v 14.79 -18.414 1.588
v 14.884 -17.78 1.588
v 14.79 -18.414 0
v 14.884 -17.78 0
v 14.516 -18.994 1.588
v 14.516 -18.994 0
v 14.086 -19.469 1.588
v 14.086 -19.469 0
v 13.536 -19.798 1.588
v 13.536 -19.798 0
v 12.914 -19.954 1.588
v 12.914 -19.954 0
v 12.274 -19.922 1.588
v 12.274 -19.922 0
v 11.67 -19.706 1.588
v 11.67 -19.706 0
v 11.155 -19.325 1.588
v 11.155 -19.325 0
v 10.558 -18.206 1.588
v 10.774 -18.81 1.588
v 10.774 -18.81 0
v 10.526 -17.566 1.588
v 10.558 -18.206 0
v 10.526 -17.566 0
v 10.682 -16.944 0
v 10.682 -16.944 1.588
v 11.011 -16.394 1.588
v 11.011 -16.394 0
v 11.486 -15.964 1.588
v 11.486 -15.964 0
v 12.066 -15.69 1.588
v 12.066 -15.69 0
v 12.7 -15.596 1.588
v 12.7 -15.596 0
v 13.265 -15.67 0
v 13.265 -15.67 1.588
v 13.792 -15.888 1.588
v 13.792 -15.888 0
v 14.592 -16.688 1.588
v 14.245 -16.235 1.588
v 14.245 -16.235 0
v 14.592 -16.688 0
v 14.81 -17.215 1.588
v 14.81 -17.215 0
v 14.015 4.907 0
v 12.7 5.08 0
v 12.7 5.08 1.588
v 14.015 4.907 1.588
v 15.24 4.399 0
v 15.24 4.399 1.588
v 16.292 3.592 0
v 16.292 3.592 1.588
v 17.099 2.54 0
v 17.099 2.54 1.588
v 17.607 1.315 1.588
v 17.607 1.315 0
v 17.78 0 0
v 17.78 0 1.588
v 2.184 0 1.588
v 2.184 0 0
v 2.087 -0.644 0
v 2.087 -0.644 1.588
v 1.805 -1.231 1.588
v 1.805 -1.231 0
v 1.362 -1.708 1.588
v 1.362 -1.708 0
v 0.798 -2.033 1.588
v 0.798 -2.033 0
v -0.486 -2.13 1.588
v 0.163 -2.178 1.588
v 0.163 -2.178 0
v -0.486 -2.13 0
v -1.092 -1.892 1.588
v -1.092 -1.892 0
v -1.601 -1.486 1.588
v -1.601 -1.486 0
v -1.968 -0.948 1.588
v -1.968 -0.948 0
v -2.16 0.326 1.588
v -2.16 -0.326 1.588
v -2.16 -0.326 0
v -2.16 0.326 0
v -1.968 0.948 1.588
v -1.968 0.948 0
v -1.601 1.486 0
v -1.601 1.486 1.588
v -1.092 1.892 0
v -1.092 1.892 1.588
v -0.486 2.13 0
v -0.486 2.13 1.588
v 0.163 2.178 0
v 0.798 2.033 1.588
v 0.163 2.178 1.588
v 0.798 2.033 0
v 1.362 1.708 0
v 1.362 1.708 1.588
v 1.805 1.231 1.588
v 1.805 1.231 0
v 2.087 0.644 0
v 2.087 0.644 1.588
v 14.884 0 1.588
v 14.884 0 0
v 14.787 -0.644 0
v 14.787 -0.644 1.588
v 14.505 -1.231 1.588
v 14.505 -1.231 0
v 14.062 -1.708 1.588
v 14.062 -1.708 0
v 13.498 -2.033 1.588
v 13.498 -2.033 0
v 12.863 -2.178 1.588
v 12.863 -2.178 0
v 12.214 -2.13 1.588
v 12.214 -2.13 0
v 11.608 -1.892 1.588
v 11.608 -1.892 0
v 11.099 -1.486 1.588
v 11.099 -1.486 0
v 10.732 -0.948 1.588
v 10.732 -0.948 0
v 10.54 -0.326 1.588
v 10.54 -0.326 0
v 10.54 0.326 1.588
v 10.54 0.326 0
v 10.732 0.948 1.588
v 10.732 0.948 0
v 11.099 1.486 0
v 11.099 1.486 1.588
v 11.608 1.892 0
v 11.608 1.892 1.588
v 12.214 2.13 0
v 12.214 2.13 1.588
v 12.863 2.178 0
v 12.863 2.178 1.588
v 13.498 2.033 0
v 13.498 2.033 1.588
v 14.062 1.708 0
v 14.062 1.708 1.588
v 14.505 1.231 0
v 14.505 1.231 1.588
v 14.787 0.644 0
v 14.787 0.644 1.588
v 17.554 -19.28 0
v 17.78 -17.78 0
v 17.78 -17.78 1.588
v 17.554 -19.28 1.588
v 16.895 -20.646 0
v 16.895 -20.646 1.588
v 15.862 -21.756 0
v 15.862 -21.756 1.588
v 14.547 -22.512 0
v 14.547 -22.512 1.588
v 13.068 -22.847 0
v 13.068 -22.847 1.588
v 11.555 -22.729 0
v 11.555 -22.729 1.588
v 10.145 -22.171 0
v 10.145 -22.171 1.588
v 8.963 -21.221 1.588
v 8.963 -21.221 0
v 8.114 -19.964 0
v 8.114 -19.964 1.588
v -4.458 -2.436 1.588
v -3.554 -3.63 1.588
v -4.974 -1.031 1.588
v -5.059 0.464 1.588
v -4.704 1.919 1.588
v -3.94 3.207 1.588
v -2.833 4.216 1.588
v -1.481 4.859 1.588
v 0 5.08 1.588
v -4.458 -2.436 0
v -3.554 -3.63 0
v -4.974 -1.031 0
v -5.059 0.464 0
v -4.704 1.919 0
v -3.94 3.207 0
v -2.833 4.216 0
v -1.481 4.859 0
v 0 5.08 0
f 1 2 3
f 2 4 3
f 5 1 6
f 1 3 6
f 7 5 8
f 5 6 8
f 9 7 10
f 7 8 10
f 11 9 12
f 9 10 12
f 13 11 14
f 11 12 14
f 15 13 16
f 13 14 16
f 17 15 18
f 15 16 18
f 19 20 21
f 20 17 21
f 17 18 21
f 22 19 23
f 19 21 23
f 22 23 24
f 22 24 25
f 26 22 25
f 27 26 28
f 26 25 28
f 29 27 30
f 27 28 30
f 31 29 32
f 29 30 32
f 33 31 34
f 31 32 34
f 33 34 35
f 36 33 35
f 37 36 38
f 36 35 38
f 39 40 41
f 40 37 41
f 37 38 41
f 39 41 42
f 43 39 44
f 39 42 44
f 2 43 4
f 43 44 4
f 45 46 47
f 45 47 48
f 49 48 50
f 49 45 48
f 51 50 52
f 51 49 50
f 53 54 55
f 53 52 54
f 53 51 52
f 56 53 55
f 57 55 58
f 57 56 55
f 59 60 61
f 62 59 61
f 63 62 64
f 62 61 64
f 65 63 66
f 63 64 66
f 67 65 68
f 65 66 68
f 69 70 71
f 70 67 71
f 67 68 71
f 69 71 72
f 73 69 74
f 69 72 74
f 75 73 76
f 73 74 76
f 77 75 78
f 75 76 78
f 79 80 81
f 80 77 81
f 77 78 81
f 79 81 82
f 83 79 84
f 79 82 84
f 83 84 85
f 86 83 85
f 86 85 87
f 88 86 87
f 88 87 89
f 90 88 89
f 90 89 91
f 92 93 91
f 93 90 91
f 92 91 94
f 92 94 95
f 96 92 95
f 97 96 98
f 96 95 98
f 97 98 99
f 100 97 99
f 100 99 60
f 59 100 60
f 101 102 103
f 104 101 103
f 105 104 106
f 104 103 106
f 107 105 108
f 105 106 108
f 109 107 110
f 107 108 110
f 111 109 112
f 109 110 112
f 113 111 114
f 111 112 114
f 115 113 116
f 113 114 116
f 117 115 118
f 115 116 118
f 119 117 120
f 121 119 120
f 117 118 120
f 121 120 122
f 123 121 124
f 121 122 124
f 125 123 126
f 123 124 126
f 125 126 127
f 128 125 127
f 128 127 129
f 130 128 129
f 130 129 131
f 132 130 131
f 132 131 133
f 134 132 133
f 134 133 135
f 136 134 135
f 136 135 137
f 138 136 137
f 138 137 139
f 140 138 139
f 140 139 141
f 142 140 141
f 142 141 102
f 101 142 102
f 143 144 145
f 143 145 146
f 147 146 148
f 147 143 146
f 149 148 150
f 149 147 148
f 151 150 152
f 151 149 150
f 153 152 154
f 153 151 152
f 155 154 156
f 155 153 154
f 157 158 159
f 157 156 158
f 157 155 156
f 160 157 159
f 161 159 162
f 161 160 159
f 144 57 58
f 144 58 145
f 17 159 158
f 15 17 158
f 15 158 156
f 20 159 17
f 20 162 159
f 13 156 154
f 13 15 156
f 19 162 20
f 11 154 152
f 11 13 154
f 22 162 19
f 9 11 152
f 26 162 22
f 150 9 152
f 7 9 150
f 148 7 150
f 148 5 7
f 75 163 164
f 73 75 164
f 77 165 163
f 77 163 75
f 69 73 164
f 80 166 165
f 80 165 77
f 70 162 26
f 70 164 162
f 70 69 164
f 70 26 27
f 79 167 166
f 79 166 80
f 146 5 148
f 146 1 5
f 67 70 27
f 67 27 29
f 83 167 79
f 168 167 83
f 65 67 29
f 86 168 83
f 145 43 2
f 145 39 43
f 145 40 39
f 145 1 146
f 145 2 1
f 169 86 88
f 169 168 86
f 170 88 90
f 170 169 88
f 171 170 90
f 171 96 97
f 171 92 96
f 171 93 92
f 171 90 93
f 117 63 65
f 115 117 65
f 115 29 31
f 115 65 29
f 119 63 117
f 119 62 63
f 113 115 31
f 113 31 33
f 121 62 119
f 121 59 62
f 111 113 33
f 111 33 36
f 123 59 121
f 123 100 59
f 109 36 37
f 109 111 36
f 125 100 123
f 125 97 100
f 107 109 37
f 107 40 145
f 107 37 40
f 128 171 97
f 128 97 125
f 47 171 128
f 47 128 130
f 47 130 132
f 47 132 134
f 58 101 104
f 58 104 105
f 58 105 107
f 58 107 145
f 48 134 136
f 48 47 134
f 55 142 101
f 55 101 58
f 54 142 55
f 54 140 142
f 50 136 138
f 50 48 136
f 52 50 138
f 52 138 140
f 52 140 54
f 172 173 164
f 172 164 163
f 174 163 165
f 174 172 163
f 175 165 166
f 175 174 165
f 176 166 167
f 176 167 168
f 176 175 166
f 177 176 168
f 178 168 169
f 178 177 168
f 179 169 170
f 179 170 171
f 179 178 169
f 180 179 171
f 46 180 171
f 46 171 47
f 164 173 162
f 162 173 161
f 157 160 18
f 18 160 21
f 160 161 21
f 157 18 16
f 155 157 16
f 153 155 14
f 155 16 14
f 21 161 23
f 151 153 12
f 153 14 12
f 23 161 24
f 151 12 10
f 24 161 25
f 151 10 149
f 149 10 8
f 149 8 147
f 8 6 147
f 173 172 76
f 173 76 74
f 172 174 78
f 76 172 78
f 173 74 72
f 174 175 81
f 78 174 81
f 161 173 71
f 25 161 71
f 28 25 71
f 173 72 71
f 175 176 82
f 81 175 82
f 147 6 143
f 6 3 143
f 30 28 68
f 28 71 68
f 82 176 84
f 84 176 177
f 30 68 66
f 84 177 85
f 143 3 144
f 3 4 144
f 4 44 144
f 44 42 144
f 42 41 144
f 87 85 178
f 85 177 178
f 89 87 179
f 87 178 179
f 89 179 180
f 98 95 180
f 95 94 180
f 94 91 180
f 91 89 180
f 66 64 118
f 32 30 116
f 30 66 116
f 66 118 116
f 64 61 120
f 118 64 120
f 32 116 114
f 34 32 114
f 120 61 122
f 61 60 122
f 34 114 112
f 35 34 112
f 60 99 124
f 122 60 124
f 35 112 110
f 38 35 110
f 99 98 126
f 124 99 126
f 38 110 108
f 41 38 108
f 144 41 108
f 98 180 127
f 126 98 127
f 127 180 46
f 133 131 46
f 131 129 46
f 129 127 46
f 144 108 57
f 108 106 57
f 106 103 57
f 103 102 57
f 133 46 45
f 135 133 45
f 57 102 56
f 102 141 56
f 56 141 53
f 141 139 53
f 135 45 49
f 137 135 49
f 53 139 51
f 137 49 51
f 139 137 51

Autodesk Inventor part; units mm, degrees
ref_plane "YZ Plane" through (0, 0, 0) normal (1, 0, 0) x (0, 1, 0)
ref_plane "XZ Plane" through (0, 0, 0) normal (0, 1, 0) x (-1, 0, 0)
ref_plane "XY Plane" through (0, 0, 0) normal (0, 0, 1) x (1, 0, 0)
sketch "Sketch1" plane through (0, 0, 0) normal (0, 0, 1) x (1, 0, 0)
  circle A0 centre (0, 0) radius 2.1844
  line L0 (0, 0) -> (12.7, 0)
  circle A1 centre (12.7, 0) radius 2.1844
  line L1 (12.7, 0) -> (12.7, -17.78)
  circle A2 centre (12.7, -17.78) radius 2.1844
  circle A3 centre (0, 0) radius 5.08
  circle A4 centre (12.7, 0) radius 5.08
  circle A5 centre (12.7, -17.78) radius 5.08
  line L2 (0, 5.08) -> (12.7, 5.08)
  line L3 (17.78, 0) -> (17.78, -17.78)
  line L4 (-4.5864, -2.1844) -> (8.1136, -19.9644)
  point P0 (-3.5538, -3.63)
  dimension "d8" = 4.3688
  dimension "d9" = 12.7
  dimension "d10" = 4.3688
  dimension "d11" = 17.78
  dimension "d12" = 4.3688
  dimension "d13" = 10.16
  dimension "d14" = 10.16
  dimension "d15" = 10.16
extrude "Extrusion2" add sketch "Sketch1" along normal blind 1.5875 contours A3 L4 | A3 L2 A4 L0 | L0 A4 L1 A5 L4 A3 | A4 L1 A1 L0 | L0 A1 L1 A4 | A3 L4 | A4 L3 A5 L1 | A5
properties part number "Wing poly connection 2"
